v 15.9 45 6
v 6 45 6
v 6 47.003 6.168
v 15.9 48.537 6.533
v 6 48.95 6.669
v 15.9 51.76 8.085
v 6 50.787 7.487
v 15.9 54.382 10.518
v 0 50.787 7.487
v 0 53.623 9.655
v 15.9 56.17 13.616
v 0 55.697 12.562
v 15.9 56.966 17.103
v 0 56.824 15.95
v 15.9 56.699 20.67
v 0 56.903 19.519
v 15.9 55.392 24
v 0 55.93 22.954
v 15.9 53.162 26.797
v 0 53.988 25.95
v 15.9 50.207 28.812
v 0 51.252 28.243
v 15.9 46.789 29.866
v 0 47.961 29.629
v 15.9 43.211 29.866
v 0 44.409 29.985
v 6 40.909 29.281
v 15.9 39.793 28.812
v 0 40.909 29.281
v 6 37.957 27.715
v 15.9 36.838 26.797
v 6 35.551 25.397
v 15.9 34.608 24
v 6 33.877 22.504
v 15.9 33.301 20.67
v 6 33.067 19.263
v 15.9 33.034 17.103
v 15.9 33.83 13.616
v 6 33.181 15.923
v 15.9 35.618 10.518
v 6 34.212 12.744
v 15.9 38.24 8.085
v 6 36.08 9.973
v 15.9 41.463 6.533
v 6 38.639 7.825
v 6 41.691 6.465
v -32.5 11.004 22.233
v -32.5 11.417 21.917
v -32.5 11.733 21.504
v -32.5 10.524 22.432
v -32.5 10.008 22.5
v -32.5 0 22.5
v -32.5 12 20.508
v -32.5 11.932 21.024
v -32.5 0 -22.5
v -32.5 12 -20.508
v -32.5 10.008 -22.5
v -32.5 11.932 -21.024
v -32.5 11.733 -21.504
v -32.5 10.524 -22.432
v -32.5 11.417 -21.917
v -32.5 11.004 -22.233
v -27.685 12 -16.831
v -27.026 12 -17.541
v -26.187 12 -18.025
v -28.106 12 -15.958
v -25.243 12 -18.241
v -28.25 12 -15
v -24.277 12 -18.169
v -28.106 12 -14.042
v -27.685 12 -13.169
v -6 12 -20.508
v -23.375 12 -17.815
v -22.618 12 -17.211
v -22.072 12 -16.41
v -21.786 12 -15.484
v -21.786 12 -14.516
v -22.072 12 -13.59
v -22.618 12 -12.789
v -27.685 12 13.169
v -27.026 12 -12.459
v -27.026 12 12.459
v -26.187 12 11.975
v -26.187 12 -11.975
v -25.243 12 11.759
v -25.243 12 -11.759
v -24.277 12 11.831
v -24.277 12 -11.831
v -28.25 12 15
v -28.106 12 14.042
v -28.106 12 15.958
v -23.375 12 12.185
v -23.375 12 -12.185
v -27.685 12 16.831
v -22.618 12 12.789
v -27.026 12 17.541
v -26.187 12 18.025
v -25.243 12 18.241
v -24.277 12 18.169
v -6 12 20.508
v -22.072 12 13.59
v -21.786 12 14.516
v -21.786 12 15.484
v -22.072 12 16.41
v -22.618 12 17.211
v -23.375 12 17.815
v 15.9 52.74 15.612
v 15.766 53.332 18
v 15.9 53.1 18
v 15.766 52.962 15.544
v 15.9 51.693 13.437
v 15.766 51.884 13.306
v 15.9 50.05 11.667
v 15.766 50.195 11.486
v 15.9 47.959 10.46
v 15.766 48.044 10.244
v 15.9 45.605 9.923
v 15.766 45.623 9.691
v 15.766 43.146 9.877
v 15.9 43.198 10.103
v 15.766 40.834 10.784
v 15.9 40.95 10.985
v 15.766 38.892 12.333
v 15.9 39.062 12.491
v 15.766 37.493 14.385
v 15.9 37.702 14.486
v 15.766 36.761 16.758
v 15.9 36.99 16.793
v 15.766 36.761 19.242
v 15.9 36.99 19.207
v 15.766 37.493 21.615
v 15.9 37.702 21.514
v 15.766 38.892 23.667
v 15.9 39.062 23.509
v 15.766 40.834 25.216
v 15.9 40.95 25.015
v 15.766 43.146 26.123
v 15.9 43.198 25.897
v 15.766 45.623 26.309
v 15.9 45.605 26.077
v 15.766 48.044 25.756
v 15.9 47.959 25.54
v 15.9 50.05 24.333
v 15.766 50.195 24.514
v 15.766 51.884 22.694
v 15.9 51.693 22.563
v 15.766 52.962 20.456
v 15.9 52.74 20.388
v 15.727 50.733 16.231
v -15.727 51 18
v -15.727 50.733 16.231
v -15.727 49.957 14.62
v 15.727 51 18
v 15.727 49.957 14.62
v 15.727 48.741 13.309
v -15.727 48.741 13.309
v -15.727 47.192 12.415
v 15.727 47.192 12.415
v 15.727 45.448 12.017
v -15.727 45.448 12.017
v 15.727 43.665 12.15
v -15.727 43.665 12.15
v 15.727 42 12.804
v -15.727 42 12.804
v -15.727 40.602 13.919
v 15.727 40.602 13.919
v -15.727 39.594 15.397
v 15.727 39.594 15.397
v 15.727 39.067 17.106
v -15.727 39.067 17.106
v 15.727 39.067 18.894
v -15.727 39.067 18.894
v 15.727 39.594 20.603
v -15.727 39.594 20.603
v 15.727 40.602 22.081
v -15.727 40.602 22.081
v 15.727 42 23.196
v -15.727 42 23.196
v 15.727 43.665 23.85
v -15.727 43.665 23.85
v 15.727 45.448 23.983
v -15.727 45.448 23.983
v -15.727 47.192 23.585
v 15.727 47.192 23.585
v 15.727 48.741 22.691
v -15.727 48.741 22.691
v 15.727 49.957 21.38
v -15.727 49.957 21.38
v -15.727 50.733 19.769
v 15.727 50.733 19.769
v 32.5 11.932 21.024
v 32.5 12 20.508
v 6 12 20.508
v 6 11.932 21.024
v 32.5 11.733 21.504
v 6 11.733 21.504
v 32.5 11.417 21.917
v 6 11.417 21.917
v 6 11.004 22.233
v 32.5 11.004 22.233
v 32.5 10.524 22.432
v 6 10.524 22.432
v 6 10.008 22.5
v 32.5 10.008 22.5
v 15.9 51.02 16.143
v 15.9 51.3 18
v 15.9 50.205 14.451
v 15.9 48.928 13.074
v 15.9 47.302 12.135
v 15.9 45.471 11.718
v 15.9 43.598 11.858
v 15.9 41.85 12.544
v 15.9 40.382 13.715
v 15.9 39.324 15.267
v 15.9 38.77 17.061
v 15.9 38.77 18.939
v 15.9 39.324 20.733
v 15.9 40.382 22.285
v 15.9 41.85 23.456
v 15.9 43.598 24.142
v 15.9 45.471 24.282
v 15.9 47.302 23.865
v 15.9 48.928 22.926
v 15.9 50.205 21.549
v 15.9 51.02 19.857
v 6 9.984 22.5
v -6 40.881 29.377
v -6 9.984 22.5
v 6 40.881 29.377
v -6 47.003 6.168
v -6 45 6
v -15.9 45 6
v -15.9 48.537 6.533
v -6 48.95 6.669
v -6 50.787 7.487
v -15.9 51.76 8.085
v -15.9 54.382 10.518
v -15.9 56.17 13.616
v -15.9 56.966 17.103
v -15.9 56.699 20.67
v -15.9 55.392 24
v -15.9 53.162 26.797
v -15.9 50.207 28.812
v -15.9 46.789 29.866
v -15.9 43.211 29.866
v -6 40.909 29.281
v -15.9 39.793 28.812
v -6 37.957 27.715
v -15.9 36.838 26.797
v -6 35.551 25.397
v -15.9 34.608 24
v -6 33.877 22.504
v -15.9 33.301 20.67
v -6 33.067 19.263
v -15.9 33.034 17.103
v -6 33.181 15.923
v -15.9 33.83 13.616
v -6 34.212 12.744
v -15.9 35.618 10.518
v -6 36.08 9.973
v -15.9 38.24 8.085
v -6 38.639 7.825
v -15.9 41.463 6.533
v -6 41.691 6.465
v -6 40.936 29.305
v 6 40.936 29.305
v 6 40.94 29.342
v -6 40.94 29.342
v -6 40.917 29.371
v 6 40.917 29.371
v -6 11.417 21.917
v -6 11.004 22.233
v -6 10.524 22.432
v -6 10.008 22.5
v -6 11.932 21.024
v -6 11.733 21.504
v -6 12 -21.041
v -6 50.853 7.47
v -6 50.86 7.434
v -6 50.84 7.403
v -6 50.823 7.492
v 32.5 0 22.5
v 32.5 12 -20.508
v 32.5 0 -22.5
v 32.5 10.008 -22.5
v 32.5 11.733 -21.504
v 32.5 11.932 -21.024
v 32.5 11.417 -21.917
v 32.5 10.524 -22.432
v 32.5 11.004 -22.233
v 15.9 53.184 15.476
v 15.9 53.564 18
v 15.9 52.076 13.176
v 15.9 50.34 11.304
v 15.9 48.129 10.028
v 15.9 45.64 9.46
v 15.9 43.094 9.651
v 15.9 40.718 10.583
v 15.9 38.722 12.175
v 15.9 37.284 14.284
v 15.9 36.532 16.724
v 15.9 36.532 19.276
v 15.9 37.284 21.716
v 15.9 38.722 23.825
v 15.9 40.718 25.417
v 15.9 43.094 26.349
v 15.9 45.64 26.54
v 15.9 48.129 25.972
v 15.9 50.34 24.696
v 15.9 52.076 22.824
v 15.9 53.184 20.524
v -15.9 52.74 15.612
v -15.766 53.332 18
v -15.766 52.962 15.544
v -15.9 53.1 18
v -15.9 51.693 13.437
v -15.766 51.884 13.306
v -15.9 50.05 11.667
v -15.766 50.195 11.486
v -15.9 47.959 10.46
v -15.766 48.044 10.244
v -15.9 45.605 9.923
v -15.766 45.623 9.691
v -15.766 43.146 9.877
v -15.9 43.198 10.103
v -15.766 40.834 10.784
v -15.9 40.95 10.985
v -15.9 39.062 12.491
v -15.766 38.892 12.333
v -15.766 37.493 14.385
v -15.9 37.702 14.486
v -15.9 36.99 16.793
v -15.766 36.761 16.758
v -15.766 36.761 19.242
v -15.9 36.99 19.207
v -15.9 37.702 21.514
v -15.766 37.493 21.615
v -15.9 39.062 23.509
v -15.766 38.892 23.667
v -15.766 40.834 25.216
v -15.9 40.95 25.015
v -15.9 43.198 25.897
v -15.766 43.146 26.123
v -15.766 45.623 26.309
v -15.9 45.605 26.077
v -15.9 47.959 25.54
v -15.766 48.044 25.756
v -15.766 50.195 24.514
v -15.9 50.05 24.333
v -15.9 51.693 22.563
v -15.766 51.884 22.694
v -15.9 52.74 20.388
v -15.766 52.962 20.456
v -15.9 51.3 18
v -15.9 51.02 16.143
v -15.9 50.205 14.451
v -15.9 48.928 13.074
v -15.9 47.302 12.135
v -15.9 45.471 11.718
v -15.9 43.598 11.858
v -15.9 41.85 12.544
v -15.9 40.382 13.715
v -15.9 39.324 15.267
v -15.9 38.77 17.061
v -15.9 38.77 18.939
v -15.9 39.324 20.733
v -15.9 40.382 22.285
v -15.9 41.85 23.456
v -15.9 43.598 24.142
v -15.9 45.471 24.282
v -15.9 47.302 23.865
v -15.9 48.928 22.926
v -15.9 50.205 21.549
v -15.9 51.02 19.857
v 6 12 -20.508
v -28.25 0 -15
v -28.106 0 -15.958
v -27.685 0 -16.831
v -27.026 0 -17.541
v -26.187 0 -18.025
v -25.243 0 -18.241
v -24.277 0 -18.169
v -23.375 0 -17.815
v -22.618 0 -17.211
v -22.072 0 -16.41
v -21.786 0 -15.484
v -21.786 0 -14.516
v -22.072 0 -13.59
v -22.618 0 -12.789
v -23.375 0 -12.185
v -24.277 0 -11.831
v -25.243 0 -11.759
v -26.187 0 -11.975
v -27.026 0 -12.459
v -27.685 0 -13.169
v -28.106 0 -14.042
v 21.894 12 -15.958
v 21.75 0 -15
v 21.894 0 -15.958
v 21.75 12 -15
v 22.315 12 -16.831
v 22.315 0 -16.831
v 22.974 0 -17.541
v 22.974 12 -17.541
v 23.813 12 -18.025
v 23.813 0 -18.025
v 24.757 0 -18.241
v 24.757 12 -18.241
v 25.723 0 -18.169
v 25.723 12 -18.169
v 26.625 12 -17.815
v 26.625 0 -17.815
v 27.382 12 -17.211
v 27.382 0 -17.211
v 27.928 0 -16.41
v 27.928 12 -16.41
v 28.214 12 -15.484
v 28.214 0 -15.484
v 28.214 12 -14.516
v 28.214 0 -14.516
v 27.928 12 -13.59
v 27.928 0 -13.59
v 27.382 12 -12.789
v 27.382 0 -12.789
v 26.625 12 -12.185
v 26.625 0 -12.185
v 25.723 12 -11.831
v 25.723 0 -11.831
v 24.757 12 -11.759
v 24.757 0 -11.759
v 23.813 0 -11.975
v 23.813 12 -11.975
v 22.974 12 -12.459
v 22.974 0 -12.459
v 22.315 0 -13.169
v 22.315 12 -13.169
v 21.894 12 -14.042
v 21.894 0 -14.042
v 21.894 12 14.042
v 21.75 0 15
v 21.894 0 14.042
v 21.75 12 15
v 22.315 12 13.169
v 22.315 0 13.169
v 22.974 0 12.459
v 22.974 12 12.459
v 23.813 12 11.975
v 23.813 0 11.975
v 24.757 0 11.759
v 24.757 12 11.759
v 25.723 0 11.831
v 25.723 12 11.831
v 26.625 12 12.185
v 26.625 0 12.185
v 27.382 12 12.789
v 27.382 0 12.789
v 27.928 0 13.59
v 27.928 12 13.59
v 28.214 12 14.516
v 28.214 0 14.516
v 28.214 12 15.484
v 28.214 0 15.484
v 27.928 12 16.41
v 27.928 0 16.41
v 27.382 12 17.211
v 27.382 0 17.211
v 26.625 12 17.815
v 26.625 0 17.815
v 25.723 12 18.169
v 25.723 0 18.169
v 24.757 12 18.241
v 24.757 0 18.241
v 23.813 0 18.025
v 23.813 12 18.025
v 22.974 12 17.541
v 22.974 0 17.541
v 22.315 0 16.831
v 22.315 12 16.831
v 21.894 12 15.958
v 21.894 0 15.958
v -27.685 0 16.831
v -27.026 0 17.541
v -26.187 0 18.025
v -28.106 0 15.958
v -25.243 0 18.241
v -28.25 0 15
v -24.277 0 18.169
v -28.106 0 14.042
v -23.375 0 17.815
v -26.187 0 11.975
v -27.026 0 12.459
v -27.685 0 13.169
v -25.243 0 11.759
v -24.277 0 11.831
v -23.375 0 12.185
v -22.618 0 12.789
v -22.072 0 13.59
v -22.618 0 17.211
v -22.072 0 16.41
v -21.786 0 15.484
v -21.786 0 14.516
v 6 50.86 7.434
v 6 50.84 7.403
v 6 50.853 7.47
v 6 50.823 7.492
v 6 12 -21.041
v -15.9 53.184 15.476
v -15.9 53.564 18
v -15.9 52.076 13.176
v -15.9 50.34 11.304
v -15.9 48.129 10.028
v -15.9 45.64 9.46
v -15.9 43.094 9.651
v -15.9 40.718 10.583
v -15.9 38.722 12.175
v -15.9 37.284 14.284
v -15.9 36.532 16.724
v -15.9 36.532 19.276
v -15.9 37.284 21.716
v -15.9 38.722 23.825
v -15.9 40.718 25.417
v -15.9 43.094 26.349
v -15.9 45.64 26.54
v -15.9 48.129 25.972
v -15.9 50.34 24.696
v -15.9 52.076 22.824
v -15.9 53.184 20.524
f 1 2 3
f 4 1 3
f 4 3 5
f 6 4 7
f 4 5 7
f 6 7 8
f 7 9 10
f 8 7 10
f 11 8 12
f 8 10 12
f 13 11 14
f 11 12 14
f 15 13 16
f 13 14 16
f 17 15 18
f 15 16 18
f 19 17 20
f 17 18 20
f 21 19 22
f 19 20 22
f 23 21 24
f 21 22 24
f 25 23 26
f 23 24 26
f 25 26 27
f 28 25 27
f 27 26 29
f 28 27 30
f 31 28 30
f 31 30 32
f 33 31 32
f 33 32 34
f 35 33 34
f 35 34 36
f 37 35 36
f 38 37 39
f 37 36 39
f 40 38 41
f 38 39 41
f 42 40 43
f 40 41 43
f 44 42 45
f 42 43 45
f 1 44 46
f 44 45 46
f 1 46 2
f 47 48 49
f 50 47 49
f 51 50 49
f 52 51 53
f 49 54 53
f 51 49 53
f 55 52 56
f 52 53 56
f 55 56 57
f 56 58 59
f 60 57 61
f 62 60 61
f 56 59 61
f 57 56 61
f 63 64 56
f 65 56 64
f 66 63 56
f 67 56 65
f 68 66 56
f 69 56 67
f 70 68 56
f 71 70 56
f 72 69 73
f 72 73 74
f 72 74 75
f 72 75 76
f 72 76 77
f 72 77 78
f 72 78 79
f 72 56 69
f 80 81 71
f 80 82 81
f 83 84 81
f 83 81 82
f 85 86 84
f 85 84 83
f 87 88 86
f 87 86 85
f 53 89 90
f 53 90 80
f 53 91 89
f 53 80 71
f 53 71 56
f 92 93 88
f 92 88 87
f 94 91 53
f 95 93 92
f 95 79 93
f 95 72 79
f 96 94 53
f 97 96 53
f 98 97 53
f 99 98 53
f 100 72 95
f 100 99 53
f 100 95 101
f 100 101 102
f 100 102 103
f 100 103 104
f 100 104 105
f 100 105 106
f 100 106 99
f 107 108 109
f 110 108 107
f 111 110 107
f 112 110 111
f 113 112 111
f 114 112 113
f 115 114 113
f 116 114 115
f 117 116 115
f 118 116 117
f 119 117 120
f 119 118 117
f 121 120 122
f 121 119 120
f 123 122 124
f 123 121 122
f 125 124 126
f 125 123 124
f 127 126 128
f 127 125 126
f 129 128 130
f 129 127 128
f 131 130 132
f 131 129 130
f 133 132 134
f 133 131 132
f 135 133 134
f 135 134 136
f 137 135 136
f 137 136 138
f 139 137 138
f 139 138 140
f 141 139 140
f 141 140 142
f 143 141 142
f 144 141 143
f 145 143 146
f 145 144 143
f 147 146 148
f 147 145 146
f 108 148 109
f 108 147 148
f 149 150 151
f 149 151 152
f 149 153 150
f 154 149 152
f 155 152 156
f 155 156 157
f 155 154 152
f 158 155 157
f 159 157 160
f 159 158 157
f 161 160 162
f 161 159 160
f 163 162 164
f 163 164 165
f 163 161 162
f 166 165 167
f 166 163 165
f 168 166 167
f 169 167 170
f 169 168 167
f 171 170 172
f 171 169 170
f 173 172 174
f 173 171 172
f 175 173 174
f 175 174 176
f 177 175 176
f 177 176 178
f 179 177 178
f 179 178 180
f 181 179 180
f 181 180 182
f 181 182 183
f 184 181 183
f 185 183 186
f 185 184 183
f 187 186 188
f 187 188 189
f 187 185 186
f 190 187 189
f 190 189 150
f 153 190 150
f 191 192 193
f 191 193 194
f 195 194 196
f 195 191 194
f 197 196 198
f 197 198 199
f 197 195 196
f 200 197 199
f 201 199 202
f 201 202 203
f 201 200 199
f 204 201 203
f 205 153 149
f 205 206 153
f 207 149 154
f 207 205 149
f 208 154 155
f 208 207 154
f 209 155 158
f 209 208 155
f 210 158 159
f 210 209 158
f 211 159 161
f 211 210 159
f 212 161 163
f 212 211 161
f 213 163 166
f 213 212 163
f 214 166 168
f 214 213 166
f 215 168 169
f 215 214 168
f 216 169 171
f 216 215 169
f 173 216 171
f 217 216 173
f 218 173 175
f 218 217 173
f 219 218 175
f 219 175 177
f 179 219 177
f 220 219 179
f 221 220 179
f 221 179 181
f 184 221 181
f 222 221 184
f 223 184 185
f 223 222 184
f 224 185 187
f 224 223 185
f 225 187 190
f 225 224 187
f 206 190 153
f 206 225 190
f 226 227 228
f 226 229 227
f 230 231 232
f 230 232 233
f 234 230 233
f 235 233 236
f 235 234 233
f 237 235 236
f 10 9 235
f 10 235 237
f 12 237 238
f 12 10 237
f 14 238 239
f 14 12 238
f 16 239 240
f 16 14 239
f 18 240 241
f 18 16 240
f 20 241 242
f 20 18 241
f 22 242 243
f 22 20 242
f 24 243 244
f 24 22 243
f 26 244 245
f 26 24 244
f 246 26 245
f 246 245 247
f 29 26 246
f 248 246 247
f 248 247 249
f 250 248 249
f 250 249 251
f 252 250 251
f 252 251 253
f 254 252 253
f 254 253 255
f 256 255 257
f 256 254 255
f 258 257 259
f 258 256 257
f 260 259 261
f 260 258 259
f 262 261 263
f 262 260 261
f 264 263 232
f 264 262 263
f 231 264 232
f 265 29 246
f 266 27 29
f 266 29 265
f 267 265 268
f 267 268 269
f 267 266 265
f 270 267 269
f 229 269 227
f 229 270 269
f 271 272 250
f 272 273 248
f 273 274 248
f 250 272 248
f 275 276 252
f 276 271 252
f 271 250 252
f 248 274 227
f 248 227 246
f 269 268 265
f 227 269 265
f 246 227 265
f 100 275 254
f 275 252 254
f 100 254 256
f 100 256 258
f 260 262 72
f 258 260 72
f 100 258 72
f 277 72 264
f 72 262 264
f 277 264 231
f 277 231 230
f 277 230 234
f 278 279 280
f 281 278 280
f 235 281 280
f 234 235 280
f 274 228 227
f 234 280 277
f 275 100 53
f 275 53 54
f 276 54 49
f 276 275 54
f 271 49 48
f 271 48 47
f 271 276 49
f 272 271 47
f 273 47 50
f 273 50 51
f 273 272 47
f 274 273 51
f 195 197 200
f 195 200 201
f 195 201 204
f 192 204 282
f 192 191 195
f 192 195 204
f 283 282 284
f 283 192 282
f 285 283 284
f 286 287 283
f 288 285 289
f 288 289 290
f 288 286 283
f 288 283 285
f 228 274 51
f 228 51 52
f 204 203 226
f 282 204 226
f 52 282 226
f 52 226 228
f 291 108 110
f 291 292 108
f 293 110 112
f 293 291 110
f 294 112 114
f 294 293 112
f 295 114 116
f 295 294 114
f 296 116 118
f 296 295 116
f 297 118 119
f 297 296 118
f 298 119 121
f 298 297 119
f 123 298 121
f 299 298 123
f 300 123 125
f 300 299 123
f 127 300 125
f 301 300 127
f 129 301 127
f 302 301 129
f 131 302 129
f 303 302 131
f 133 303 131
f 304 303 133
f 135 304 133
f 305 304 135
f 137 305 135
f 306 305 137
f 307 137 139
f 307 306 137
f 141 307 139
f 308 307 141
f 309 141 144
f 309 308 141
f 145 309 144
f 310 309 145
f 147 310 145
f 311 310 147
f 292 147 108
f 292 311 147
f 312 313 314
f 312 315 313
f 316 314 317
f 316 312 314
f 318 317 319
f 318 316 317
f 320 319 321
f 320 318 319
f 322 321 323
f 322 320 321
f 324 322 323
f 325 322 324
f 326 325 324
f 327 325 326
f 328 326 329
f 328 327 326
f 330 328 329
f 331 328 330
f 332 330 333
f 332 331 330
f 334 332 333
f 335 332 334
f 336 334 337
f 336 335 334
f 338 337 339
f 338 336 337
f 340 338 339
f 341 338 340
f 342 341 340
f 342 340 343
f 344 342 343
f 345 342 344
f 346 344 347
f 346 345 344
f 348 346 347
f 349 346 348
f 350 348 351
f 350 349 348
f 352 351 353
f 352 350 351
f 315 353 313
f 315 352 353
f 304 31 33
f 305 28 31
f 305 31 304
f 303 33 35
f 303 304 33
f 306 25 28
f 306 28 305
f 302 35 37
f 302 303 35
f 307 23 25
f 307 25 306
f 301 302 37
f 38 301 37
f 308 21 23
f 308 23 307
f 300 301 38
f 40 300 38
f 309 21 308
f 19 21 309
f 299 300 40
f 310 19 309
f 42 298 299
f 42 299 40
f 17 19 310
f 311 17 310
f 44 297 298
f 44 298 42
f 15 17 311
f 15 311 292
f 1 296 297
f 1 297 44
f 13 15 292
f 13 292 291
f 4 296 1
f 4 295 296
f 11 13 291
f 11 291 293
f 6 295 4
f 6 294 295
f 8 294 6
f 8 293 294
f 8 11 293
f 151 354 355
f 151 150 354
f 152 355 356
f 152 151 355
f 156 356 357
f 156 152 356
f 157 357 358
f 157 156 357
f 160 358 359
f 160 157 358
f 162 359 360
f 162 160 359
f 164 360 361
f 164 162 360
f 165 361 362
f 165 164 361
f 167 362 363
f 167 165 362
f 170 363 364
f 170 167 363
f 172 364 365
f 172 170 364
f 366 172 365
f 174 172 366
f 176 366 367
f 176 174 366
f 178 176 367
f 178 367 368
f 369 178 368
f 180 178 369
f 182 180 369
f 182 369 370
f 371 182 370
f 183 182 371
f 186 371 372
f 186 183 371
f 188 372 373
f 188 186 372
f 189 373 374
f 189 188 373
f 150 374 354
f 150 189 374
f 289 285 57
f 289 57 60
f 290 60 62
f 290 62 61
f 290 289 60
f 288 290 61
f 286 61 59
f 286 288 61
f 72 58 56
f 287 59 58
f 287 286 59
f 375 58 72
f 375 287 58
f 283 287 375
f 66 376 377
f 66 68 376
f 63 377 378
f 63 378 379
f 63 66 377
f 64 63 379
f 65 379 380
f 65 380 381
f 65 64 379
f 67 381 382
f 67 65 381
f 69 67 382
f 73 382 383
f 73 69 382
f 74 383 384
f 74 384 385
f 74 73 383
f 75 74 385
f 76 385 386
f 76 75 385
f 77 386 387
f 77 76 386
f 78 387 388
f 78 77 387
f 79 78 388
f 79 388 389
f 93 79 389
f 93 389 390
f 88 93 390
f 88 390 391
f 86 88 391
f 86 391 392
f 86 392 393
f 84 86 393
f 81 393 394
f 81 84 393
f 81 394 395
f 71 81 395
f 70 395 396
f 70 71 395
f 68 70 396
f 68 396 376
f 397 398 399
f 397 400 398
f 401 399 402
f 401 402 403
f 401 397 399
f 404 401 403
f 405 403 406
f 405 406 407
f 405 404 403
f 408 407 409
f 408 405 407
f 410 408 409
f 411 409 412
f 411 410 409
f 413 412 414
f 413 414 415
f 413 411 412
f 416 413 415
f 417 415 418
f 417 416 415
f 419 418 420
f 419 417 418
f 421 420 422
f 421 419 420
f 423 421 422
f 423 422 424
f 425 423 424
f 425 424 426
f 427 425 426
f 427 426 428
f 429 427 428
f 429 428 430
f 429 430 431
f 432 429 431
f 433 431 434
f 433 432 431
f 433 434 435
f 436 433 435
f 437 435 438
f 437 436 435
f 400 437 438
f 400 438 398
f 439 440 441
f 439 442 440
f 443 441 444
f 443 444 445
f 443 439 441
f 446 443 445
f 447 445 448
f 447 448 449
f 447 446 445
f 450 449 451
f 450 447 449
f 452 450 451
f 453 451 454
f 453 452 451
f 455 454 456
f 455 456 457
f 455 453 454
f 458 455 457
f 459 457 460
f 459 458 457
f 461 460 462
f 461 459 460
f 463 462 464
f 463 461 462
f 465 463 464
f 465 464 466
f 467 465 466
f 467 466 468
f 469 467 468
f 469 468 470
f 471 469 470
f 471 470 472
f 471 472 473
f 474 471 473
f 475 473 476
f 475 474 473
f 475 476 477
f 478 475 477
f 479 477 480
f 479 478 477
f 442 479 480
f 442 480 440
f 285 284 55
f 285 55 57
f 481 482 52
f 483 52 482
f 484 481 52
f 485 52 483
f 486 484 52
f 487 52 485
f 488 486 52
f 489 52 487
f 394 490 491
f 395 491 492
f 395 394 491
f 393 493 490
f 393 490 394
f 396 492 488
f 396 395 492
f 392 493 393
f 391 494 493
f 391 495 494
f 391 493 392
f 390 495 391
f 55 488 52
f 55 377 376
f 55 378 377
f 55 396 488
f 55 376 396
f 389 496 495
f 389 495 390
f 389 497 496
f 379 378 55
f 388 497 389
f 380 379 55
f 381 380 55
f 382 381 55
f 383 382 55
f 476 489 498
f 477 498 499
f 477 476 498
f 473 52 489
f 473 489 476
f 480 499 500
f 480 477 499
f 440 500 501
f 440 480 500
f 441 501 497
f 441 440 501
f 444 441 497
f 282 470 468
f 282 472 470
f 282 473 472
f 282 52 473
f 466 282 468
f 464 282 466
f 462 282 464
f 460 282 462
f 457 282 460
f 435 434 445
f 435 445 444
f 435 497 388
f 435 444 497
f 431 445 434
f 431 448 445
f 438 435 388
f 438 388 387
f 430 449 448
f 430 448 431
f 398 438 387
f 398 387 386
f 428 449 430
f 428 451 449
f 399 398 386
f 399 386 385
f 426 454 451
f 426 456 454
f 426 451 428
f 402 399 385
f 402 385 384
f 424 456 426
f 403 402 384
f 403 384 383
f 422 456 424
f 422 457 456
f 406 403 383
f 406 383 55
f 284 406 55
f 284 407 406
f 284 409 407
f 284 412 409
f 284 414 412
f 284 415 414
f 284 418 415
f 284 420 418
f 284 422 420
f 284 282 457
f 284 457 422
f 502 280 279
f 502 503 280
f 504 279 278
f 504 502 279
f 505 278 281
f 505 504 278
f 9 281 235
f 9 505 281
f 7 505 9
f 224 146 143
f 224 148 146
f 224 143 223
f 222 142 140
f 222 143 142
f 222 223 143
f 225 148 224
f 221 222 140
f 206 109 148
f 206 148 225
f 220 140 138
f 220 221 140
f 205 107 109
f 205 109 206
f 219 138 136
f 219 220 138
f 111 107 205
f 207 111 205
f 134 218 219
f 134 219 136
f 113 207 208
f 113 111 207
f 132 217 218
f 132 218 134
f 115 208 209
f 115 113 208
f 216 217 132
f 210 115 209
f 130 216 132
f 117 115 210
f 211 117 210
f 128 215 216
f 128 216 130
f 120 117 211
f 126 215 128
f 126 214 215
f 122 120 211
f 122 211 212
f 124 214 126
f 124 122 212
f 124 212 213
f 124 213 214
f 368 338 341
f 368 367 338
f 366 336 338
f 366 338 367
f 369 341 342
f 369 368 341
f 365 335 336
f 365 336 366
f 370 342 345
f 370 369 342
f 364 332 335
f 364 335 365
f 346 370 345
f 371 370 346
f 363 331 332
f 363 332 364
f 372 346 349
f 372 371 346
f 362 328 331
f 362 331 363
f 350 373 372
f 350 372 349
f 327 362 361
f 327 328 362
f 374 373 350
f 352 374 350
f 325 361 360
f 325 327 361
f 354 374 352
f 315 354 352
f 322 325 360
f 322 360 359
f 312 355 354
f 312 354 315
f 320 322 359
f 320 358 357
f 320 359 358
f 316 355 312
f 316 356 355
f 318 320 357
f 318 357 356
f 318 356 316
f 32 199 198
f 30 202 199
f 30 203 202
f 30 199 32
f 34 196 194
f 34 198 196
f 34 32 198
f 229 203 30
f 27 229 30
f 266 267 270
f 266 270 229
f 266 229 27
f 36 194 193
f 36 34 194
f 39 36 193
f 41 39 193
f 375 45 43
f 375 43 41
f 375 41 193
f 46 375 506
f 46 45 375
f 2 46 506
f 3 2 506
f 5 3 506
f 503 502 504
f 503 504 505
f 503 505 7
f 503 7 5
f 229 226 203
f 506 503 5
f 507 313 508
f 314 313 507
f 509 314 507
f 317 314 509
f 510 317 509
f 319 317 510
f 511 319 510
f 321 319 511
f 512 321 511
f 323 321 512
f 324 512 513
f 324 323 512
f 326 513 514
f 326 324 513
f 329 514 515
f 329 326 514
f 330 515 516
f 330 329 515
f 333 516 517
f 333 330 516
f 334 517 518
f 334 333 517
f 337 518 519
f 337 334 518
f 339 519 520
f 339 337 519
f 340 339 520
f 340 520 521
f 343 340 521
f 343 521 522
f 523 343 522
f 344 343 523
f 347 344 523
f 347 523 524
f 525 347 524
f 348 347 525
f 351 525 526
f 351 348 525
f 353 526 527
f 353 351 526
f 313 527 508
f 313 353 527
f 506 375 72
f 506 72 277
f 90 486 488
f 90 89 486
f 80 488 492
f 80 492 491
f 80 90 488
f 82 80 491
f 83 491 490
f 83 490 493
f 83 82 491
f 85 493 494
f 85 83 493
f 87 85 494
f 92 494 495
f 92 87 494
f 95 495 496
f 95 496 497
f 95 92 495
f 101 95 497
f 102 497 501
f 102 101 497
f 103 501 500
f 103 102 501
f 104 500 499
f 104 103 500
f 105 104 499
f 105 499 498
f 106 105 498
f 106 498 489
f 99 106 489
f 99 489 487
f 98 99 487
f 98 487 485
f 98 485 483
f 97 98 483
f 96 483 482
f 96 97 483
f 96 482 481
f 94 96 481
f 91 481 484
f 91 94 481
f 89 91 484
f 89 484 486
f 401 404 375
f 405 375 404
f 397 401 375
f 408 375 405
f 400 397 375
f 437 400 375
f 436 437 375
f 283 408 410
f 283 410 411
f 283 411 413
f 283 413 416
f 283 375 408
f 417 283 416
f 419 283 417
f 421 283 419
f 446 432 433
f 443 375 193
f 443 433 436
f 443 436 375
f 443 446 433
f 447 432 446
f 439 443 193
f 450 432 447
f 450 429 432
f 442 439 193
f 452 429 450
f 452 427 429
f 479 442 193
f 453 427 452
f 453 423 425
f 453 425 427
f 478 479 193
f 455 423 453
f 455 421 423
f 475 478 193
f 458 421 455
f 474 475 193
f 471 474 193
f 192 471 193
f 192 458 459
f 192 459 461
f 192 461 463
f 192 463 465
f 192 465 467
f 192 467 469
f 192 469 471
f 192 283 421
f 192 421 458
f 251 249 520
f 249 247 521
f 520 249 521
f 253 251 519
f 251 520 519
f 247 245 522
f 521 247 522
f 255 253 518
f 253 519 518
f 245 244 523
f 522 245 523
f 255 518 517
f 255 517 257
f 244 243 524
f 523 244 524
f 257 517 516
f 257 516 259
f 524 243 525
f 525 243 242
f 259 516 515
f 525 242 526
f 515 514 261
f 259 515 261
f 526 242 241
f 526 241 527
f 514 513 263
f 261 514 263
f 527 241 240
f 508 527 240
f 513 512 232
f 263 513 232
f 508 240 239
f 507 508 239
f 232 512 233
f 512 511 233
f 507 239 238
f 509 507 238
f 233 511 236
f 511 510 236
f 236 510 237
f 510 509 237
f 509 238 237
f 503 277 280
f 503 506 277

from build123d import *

# Parameters (mm, degrees)
BOSS_EXTRUDE1_DEPTH      = 32.5
BOSS_EXTRUDE1_DEPTH_BACK = 32.5
BOSS_EXTRUDE2_DEPTH      = 6
BOSS_EXTRUDE2_DEPTH_BACK = 6
BOSS_EXTRUDE3_DEPTH      = 15.9
BOSS_EXTRUDE3_DEPTH_BACK = 15.9
SKETCH3_R                = 12
SKETCH4_W                = 3.25
SKETCH4_H                = 12
SKETCH5_W                = 3.25
SKETCH5_H                = 12
SKETCH6_W                = 3.25
SKETCH6_H                = 12
SKETCH7_W                = 3.25
SKETCH7_H                = 12


with BuildPart() as part:
    # Sketch1 → Boss-Extrude1 (new, two sides: drawn at the far end of the back side and taken through both)
    with BuildSketch(Plane(origin=(0, 0, 0), x_dir=(0, 0, -1), z_dir=(1, 0, 0)).offset(-BOSS_EXTRUDE1_DEPTH_BACK)):
        with BuildLine():
            Line((-22.5, 10.008), (-22.5, 0))
            Line((-22.5, 0), (22.5, 0))
            Line((22.5, 0), (22.5, 10.008))
            ThreePointArc((22.5, 10.008), (21.916556708, 11.416556708), (20.508, 12))
            Line((20.508, 12), (-20.508, 12))
            ThreePointArc((-20.508, 12), (-21.916556708, 11.416556708), (-22.5, 10.008))
        make_face()
    extrude(amount=BOSS_EXTRUDE1_DEPTH + BOSS_EXTRUDE1_DEPTH_BACK)

    # Sketch2 → Boss-Extrude2 (add, two sides: drawn at the far end of the back side and taken through both)
    with BuildSketch(Plane(origin=(0, 0, 0), x_dir=(0, 0, -1), z_dir=(1, 0, 0)).offset(-BOSS_EXTRUDE2_DEPTH_BACK)):
        with BuildLine():
            Line((-29.376798431, 40.880721246), (-22.5, 9.984))
            ThreePointArc((-22.5, 9.984), (-21.909527271, 11.409527271), (-20.484, 12))
            Line((-20.484, 12), (21.041171881, 12))
            Line((21.041171881, 12), (-7.403239928, 50.840263348))
            ThreePointArc((-7.403239928, 50.840263348), (-7.470461582, 50.852879627), (-7.487381792, 50.786610269))
            ThreePointArc((-7.487381792, 50.786610269), (-13.04609099, 34.070279714), (-29.280988595, 40.908631486))
            ThreePointArc((-29.280988595, 40.908631486), (-29.341976877, 40.939588733), (-29.376798431, 40.880721246))
        make_face()
    extrude(amount=BOSS_EXTRUDE2_DEPTH + BOSS_EXTRUDE2_DEPTH_BACK)

    # Sketch3 → Boss-Extrude3 (add, two sides: drawn at the far end of the back side and taken through both)
    with BuildSketch(Plane(origin=(0, 0, 0), x_dir=(0, 0, -1), z_dir=(1, 0, 0)).offset(-BOSS_EXTRUDE3_DEPTH_BACK)):
        with Locations((-18, 45)):
            Circle(SKETCH3_R)
    extrude(amount=BOSS_EXTRUDE3_DEPTH + BOSS_EXTRUDE3_DEPTH_BACK)

    # Sketch4 → Cut-Revolve1 (revolve, cut)
    with BuildSketch(Plane.XY.offset(15)):
        with Locations((-26.625, 6)):
            Rectangle(SKETCH4_W, SKETCH4_H)
    revolve(axis=Axis((-25, 12, 15), (0, -1, 0)), mode=Mode.SUBTRACT)

    # Sketch5 → Cut-Revolve2 (revolve, cut)
    with BuildSketch(Plane.XY.offset(15)):
        with Locations((23.375, 6)):
            Rectangle(SKETCH5_W, SKETCH5_H)
    revolve(axis=Axis((25, 12, 15), (0, -1, 0)), mode=Mode.SUBTRACT)

    # Sketch6 → Cut-Revolve3 (revolve, cut)
    with BuildSketch(Plane.XY.offset(-15)):
        with Locations((-26.625, 6)):
            Rectangle(SKETCH6_W, SKETCH6_H)
    revolve(axis=Axis((-25, 12, -15), (0, -1, 0)), mode=Mode.SUBTRACT)

    # Sketch7 → Cut-Revolve4 (revolve, cut)
    with BuildSketch(Plane.XY.offset(-15)):
        with Locations((23.375, 6)):
            Rectangle(SKETCH7_W, SKETCH7_H)
    revolve(axis=Axis((25, 12, -15), (0, -1, 0)), mode=Mode.SUBTRACT)

    # Sketch8 → Cut-Revolve5 (revolve, cut)
    with BuildSketch(Plane.XY.offset(18)):
        Polygon((-15.9, 45), (-15.9, 53.564), (-15.611324865, 53.064), (15.611324865, 53.064), (15.9, 53.564), (15.9, 45), align=None)
    revolve(axis=Axis((15.9, 45, 18), (-1, 0, 0)), mode=Mode.SUBTRACT)

    # Sketch9 → Revolve1 (revolve)
    with BuildSketch(Plane.XY.offset(18)):
        Polygon((-15.9, 51.3), (-15.726794919, 51), (15.726794919, 51), (15.9, 51.3), (15.9, 53.1), (15.726794919, 53.4), (-15.726794919, 53.4), (-15.9, 53.1), align=None)
    revolve(axis=Axis((15.9, 45, 18), (-1, 0, 0)))


solid = part.part
